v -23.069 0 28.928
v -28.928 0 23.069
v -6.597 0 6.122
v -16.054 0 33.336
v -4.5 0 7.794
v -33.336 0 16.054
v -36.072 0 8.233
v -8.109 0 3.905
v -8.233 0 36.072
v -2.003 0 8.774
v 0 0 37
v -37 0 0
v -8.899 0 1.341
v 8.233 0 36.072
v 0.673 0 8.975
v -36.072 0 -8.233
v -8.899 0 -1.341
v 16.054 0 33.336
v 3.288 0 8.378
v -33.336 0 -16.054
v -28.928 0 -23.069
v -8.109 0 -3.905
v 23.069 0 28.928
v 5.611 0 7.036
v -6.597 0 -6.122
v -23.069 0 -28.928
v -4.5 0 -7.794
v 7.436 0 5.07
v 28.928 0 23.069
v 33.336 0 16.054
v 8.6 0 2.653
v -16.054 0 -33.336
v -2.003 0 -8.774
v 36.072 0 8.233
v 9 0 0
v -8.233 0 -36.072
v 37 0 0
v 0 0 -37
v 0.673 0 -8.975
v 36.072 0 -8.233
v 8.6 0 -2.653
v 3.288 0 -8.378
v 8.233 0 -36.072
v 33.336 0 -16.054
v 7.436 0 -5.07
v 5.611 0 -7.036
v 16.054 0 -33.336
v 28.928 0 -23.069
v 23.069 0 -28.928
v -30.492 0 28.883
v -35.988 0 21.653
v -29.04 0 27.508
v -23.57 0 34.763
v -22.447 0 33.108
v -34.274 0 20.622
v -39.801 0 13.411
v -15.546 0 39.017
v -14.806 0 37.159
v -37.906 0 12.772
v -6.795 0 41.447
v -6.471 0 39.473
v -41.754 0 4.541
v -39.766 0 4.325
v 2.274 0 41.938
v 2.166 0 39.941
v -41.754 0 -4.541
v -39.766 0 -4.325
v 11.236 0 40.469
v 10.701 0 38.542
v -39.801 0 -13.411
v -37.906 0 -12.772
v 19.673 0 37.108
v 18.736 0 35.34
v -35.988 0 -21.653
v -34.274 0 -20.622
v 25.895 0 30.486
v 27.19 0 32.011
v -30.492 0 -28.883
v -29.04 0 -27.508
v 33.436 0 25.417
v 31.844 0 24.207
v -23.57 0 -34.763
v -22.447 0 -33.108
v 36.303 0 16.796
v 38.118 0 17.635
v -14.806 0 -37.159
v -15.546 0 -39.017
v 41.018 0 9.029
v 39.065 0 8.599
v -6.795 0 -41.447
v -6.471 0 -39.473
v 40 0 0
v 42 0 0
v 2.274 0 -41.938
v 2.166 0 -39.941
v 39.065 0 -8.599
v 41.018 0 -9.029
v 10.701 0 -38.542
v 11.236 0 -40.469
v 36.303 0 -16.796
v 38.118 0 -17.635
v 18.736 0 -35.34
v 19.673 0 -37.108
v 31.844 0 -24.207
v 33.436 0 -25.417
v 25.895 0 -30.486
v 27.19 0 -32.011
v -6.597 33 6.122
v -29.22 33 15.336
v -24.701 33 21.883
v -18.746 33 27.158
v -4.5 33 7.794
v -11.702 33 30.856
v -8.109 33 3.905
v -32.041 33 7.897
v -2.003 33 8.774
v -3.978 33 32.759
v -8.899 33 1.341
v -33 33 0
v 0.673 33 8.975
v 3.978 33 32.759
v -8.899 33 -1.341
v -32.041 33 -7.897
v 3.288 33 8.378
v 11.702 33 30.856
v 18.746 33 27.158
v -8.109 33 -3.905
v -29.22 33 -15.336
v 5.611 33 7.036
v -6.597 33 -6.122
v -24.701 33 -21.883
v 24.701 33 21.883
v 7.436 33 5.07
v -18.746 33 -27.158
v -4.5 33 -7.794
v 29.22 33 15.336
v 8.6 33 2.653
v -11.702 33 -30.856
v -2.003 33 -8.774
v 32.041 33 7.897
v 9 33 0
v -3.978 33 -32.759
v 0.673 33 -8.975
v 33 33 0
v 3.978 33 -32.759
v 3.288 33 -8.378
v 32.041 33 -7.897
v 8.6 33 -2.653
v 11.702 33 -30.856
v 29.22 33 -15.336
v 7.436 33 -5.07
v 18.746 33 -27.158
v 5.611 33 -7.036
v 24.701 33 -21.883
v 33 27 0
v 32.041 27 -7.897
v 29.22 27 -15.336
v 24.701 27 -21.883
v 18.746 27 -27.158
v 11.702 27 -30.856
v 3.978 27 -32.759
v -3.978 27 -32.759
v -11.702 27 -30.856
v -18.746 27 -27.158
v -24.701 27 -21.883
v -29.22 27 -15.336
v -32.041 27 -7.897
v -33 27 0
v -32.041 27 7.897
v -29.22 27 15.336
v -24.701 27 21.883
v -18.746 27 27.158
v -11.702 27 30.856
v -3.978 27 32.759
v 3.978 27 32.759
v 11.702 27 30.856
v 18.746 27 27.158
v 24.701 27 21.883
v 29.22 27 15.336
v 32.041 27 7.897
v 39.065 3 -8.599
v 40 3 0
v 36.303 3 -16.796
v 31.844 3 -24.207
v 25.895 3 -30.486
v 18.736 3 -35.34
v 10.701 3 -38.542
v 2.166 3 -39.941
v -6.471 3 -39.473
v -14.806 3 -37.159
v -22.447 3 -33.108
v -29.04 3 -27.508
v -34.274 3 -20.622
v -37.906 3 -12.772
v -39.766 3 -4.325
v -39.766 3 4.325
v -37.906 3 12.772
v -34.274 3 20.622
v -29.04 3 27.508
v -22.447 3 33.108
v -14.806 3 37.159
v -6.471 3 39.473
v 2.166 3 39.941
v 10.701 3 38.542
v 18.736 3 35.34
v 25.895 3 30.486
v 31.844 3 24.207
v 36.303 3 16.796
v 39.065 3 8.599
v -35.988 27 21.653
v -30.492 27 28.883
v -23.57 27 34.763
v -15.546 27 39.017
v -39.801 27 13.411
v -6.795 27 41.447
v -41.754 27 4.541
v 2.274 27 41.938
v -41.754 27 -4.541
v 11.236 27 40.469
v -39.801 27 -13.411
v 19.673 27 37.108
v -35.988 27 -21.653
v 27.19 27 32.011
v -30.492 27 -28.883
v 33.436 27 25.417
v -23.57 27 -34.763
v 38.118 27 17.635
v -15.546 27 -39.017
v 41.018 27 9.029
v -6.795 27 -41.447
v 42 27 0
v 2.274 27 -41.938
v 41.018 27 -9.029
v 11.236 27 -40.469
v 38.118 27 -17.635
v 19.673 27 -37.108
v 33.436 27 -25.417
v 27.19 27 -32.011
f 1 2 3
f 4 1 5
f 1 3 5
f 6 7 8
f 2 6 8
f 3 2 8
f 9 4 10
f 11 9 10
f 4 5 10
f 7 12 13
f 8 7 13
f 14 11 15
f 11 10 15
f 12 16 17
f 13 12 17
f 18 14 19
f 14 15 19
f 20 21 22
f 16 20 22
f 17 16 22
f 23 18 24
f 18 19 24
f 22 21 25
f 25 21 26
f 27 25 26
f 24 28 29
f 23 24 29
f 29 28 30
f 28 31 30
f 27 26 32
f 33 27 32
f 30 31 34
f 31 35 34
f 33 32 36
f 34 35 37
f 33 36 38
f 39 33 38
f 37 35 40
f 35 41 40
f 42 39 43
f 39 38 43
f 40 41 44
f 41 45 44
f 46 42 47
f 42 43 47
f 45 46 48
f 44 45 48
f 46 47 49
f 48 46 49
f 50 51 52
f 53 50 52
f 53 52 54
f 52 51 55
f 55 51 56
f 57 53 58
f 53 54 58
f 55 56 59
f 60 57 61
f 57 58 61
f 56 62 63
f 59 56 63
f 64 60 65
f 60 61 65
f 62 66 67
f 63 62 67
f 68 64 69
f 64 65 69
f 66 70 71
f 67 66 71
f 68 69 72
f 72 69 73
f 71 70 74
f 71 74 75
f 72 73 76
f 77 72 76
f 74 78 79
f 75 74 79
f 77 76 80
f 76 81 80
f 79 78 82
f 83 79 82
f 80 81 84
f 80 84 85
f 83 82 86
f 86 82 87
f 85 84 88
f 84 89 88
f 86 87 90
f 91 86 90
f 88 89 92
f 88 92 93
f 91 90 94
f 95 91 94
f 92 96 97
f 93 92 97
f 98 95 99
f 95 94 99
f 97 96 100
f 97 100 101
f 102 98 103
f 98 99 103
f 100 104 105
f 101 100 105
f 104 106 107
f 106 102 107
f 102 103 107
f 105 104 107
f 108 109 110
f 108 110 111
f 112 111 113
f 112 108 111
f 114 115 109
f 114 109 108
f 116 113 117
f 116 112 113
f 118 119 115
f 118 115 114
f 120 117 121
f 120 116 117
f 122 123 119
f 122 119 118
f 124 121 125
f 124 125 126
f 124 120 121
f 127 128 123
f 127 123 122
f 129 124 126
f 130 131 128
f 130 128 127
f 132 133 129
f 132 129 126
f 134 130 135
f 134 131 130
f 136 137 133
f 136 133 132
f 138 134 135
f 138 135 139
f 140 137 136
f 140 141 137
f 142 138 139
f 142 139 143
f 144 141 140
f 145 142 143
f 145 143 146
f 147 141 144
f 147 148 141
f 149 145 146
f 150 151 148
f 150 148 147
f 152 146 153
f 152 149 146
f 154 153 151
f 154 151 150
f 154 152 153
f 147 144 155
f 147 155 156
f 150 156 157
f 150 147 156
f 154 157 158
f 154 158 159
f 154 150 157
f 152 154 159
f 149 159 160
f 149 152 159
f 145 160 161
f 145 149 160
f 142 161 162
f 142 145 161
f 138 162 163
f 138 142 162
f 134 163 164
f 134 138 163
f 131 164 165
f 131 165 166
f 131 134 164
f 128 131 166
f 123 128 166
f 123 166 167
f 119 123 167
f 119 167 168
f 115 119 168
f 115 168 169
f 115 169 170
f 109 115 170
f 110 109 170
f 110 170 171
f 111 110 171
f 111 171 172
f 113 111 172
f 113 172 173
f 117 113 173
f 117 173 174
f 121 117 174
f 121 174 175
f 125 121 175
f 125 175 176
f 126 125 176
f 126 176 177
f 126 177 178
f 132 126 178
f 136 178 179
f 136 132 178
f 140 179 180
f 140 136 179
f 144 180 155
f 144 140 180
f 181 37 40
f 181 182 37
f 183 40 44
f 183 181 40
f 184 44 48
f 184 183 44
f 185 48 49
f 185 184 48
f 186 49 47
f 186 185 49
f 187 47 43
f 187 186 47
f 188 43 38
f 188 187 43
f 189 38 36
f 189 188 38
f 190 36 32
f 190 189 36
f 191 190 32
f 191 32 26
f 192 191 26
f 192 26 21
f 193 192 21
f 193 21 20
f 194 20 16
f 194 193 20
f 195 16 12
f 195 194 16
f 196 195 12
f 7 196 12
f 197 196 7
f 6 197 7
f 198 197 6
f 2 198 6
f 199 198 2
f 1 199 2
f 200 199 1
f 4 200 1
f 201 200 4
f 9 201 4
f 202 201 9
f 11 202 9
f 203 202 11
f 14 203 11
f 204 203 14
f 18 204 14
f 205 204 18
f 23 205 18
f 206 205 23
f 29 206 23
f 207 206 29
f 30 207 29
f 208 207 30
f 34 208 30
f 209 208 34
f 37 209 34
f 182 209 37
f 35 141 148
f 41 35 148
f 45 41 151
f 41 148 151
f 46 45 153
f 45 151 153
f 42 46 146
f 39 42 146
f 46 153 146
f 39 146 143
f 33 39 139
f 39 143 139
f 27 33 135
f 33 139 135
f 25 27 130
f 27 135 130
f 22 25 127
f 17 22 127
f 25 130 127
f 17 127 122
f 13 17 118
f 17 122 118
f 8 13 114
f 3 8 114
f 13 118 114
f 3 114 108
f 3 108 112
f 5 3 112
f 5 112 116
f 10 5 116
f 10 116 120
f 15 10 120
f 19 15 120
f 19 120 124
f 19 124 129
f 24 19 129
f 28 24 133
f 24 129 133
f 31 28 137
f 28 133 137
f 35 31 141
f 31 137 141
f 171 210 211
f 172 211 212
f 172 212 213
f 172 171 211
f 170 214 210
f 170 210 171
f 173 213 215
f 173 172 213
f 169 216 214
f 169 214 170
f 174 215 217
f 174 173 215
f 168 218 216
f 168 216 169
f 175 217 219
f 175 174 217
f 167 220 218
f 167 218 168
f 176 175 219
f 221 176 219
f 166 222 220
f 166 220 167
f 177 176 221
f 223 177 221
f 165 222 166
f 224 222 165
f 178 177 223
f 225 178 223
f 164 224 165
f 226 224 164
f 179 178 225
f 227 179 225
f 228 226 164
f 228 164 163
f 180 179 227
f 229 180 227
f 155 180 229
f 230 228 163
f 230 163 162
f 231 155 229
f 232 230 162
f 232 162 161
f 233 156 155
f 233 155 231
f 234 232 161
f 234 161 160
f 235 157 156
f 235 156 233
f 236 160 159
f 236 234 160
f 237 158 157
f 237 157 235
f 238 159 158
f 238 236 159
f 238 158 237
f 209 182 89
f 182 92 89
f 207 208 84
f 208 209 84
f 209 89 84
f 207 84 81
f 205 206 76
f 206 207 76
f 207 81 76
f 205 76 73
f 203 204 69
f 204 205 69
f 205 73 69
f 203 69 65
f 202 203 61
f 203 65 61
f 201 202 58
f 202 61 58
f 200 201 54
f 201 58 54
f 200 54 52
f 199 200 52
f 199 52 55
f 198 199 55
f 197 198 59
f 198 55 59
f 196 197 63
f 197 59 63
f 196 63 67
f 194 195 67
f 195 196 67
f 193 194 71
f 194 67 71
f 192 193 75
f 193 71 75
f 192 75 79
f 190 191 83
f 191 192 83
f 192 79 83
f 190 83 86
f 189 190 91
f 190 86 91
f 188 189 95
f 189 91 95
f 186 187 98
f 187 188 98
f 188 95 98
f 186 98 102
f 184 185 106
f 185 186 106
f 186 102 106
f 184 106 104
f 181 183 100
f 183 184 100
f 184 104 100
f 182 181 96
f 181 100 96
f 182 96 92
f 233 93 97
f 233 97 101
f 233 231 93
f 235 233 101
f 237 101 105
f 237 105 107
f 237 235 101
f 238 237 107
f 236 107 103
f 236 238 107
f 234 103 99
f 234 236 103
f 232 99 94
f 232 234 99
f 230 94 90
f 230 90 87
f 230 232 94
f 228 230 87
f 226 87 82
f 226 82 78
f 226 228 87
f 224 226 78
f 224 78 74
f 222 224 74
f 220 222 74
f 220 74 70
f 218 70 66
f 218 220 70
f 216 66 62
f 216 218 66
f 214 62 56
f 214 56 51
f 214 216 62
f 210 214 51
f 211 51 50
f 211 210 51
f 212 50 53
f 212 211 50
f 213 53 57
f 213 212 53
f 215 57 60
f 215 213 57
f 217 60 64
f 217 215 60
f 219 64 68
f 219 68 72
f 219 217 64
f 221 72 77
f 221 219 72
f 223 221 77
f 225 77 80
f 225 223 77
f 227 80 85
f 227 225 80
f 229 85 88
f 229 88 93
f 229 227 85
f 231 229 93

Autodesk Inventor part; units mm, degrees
ref_plane "YZ Plane" through (0, 0, 0) normal (1, 0, 0) x (0, 1, 0)
ref_plane "XZ Plane" through (0, 0, 0) normal (0, 1, 0) x (-1, 0, 0)
ref_plane "XY Plane" through (0, 0, 0) normal (0, 0, 1) x (1, 0, 0)
sketch "Boceto1" plane through (0, 0, 0) normal (0, 0, 1) x (1, 0, 0)
  line L0 (0, 0) -> (9, 0) construction
  line L1 (9, 0) -> (9, 33)
  line L2 (42, 0) -> (42, 27)
  line L3 (42, 27) -> (33, 27)
  line L4 (33, 27) -> (33, 33)
  line L5 (33, 33) -> (9, 33)
  line L6 (42, 0) -> (42, 3) construction
  line L7 (42, 3) -> (40, 3) construction
  line L8 (40, 3) -> (37, 0)
  line L9 (40, 3) -> (43.5355, 3) construction
  line L10 (40, 3) -> (40, 0)
  line L11 (9, 0) -> (37, 0)
  line L12 (40, 0) -> (42, 0)
  line L13 (0, 0) -> (0, 41.2707) construction
  dimension "d0" = 9
  dimension "d1" = 33
  dimension "d2" = 33
  dimension "d3" = 27
  dimension "d4" = 9
  dimension "d5" = 3
  dimension "d6" = 2
  dimension "d7" = 135
  dimension "d8" = 6
revolve "Revolución1" add sketch "Boceto1" angle 360 about axis through (0, 0, 0) along (0, 1, 0)
properties part number "6_Piston"
